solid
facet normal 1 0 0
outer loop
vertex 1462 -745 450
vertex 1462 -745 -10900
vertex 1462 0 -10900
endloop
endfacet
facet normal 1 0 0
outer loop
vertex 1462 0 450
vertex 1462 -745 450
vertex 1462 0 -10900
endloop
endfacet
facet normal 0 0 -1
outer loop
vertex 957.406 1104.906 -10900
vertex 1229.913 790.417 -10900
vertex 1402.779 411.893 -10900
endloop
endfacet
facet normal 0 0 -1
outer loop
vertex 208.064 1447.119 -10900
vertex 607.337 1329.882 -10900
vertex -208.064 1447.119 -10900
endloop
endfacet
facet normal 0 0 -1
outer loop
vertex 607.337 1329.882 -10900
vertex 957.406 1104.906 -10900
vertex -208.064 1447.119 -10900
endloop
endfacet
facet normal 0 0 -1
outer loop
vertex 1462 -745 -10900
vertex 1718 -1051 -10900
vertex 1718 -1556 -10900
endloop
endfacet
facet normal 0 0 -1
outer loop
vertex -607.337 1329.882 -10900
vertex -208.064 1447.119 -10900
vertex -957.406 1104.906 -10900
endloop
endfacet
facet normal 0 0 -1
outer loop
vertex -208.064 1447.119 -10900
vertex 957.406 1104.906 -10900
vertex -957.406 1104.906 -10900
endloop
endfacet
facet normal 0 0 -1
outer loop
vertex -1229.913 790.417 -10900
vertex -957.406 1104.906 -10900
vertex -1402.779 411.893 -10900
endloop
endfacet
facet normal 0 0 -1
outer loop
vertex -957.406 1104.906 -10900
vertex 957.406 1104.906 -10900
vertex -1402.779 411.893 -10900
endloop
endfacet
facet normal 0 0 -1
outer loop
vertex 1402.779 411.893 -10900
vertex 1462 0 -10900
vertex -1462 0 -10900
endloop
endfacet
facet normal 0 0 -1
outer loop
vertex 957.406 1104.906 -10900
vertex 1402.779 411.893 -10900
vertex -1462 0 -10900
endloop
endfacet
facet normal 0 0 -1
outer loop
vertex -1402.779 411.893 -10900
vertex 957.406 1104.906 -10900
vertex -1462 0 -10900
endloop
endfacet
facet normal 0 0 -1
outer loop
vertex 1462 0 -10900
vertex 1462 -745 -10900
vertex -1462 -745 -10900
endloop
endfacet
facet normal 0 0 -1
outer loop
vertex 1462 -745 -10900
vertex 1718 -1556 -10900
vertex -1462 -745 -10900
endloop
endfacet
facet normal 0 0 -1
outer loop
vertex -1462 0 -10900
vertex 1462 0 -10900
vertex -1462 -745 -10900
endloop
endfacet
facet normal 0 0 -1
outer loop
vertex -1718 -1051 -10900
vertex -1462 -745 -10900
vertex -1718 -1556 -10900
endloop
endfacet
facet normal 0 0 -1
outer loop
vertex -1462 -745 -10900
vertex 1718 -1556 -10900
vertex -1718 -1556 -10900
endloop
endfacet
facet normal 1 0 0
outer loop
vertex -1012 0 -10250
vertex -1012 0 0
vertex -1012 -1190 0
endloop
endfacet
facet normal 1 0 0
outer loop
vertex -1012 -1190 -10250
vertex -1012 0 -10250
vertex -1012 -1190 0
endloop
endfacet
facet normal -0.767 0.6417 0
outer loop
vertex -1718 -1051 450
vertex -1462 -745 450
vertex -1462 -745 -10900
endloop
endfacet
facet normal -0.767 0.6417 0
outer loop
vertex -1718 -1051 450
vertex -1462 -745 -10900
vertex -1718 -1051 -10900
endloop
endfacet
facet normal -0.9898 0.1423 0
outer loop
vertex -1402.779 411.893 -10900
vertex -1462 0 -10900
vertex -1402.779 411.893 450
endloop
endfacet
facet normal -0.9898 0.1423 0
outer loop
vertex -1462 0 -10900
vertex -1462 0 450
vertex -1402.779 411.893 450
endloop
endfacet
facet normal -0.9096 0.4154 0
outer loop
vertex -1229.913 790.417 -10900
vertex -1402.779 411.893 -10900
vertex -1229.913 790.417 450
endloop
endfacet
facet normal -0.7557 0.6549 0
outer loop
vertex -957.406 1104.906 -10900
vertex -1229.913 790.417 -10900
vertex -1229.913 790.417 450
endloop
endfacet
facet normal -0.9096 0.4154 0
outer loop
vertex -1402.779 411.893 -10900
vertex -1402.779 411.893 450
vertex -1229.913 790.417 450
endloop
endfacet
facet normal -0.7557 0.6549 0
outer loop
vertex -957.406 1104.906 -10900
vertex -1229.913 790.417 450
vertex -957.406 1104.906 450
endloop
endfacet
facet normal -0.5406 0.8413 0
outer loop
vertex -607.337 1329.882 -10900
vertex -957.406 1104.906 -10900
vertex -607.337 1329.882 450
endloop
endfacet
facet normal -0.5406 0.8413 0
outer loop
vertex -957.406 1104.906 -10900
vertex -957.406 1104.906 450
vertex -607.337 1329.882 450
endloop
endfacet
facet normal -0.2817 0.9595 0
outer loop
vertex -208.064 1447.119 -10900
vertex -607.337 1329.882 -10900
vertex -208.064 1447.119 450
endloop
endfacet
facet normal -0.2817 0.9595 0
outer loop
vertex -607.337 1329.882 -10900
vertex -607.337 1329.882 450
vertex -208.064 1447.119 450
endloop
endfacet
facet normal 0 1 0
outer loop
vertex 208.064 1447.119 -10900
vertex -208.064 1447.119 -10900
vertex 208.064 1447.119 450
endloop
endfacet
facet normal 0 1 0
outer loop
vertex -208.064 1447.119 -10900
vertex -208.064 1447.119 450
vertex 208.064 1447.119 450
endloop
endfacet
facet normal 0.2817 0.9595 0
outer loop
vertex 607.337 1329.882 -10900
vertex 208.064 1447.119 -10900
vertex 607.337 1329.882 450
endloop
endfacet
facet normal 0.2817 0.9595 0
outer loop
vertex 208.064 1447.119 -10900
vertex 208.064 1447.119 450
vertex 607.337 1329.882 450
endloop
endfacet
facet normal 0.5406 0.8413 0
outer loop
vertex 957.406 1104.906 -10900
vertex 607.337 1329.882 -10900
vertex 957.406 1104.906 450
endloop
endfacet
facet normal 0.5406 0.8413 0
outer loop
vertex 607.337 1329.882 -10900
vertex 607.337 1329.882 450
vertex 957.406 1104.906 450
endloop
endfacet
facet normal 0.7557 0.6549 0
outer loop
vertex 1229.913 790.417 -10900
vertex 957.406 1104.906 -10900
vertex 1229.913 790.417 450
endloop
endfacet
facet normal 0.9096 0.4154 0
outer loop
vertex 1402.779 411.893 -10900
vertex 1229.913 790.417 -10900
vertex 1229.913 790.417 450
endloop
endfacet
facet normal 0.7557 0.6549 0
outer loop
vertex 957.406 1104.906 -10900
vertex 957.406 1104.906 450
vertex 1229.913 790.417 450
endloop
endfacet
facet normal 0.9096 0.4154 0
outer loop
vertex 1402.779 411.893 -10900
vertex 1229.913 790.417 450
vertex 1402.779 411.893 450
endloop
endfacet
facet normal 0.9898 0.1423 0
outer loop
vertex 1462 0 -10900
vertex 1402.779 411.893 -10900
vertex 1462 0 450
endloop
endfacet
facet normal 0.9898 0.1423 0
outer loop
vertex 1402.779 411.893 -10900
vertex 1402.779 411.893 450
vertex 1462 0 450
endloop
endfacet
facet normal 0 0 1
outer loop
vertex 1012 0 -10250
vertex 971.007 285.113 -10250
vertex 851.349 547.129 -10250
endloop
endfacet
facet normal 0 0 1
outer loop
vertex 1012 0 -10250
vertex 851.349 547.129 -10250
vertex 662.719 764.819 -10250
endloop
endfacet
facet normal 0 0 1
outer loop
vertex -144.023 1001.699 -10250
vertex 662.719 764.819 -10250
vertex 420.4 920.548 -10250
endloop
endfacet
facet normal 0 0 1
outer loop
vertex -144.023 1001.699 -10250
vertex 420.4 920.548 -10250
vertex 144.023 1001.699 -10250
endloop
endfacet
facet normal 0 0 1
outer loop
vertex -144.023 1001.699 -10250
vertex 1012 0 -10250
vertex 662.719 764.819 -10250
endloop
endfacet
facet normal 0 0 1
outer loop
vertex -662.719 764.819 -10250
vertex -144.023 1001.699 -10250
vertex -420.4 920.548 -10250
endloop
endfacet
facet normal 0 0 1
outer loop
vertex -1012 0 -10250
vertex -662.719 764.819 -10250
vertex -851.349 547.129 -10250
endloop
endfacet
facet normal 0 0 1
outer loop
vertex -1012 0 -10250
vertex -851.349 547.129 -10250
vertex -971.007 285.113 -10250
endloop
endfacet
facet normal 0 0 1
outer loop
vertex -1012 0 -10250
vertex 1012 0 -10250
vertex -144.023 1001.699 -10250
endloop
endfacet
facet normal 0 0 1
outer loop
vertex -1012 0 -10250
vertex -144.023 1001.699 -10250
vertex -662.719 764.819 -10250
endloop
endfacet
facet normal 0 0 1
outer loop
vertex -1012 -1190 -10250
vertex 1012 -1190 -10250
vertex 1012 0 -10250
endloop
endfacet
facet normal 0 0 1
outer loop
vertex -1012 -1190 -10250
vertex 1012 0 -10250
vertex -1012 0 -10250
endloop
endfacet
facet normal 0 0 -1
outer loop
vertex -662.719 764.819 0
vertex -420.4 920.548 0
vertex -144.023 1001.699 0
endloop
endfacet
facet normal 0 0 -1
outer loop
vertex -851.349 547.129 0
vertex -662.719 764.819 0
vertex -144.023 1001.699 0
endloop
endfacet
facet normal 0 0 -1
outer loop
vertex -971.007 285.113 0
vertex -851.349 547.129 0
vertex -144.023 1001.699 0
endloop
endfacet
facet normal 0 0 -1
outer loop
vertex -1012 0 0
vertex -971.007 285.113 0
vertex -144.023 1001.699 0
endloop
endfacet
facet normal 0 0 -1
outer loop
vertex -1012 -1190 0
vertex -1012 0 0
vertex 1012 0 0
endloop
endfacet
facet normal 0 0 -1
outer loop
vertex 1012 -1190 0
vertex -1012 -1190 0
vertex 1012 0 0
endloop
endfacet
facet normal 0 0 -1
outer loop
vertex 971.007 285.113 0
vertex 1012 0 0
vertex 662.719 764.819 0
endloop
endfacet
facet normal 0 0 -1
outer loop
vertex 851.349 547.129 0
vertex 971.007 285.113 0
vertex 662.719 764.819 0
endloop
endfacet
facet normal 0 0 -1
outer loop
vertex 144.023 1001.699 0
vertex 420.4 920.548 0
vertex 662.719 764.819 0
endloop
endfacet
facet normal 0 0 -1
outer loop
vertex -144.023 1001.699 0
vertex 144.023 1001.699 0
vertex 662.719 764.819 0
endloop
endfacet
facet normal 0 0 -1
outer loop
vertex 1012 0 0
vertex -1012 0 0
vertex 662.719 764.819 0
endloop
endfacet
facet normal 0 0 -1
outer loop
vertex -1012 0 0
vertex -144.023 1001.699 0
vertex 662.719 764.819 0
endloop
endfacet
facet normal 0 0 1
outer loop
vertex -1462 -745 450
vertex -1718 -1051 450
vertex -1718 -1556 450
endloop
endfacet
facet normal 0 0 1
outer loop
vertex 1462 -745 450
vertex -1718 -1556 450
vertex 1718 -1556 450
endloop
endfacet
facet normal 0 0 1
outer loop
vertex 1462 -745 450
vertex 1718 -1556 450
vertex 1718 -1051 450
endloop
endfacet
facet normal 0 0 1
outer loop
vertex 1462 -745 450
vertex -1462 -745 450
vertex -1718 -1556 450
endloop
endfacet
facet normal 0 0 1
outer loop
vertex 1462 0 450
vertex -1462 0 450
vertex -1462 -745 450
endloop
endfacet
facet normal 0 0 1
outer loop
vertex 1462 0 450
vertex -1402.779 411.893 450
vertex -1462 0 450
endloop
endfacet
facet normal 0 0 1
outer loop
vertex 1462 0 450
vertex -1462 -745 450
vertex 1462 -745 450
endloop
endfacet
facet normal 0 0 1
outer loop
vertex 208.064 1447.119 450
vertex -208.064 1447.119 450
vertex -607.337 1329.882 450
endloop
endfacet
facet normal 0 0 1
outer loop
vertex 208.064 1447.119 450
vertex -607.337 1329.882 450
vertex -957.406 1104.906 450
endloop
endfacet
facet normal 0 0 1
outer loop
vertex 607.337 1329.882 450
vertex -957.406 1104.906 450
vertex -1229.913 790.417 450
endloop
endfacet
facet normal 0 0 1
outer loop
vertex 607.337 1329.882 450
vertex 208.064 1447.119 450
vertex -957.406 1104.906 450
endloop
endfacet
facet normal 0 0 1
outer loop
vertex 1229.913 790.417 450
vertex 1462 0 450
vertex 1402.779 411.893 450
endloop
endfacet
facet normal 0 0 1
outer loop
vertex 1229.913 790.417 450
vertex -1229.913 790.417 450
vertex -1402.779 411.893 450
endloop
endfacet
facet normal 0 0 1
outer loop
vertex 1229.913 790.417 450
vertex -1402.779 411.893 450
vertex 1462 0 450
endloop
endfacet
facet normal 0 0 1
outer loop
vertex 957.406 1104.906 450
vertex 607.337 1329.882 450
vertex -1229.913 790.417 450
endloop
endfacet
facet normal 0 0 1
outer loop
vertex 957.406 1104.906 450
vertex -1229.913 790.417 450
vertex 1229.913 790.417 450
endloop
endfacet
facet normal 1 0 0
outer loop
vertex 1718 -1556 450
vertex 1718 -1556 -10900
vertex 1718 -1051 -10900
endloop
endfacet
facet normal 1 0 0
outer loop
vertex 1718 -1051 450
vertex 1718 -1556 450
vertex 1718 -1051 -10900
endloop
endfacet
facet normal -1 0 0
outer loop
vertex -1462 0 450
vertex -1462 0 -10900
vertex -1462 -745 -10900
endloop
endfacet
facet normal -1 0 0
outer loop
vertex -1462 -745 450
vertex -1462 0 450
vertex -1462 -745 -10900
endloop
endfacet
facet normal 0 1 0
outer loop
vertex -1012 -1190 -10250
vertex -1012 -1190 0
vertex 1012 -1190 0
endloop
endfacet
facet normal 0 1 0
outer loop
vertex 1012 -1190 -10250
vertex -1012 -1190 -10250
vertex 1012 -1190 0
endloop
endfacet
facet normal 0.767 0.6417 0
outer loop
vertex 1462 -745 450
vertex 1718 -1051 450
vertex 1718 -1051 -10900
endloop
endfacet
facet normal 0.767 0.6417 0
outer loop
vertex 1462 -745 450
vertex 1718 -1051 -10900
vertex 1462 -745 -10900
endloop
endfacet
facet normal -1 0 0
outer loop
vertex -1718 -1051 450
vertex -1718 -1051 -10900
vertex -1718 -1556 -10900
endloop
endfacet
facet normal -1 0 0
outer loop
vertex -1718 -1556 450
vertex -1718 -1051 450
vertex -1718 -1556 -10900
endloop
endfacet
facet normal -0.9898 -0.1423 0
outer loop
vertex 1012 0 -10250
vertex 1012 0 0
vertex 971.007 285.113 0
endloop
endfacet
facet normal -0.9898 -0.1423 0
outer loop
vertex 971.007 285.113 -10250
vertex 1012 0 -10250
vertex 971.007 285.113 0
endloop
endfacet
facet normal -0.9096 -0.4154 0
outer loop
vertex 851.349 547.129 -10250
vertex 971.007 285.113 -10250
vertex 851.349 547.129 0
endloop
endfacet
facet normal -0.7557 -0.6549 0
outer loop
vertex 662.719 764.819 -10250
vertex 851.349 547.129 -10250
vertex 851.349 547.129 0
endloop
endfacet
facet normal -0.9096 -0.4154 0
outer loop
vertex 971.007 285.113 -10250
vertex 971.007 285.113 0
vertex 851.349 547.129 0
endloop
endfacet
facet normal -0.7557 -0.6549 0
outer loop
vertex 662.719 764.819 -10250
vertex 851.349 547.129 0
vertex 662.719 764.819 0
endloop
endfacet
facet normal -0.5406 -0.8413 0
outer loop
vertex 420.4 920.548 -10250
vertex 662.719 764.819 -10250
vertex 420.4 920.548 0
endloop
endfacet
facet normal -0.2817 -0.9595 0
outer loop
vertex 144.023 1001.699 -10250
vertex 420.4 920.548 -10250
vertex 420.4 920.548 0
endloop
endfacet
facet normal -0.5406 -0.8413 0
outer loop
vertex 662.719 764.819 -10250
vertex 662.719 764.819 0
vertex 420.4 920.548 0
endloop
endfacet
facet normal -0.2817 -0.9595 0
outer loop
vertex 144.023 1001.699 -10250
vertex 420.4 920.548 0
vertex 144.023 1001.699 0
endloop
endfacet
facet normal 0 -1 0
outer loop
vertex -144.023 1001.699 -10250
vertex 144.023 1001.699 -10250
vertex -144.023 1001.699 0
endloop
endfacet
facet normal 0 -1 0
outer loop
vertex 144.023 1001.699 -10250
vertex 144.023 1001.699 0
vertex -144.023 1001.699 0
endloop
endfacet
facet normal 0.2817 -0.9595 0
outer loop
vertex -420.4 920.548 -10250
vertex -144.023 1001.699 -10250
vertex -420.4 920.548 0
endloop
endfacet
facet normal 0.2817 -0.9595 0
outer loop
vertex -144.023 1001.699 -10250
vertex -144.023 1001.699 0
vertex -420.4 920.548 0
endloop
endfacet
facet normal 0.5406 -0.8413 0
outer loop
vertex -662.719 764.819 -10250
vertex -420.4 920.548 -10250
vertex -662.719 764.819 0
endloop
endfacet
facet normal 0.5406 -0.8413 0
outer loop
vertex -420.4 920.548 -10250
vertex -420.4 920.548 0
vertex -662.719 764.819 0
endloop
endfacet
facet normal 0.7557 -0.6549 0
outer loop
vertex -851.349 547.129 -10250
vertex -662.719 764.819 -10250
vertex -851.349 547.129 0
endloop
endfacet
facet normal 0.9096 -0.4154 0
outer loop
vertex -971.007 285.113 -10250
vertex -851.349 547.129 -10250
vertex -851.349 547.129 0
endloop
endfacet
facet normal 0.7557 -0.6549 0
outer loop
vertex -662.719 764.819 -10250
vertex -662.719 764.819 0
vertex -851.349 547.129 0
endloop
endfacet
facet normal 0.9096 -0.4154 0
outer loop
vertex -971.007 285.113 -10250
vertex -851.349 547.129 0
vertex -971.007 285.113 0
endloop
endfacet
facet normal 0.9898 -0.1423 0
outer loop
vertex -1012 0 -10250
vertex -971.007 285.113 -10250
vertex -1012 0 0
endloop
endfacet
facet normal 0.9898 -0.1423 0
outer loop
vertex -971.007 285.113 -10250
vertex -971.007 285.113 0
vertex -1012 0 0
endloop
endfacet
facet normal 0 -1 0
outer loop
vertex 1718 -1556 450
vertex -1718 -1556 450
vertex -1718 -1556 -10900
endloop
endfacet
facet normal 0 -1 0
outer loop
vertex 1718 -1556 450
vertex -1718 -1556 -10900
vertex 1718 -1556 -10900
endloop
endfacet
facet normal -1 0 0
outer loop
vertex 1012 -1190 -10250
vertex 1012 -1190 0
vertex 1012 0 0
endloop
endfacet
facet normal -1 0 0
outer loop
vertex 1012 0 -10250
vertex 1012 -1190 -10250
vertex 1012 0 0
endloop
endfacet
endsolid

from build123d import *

# Parameters (mm, degrees)
PAD_DEPTH    = 10250
PAD001_DEPTH = 450
PAD002_DEPTH = 650


with BuildPart() as part:
    # Sketch001 → Pad (new body)
    with BuildSketch(Plane.XY):
        with BuildLine():
            ThreePointArc((1462, 0), (0, 1462), (-1462, 0))
            Line((-1462, 0), (-1462, -745))
            Line((-1462, -745), (-1718, -1051))
            Line((-1718, -1051), (-1718, -1556))
            Line((-1718, -1556), (1718, -1556))
            Line((1718, -1556), (1718, -1051))
            Line((1718, -1051), (1462, -745))
            Line((1462, -745), (1462, 0))
        make_face()
        with BuildLine():
            ThreePointArc((1012, 0), (0, 1012), (-1012, 0))
            Line((-1012, 0), (-1012, -1190))
            Line((-1012, -1190), (1012, -1190))
            Line((1012, -1190), (1012, 0))
        make_face(mode=Mode.SUBTRACT)
    extrude(amount=-PAD_DEPTH)

    # Sketch002 (on Face13 of Pad) → Pad001 (join)
    with BuildSketch(Plane.XY):
        with BuildLine():
            Line((-1462, 0), (-1462, -745))
            Line((-1462, -745), (-1718, -1051))
            Line((-1718, -1051), (-1718, -1556))
            Line((-1718, -1556), (1718, -1556))
            Line((1718, -1556), (1718, -1051))
            Line((1718, -1051), (1462, -745))
            Line((1462, -745), (1462, 0))
            ThreePointArc((1462, 0), (0, 1462), (-1462, 0))
        make_face()
    extrude(amount=PAD001_DEPTH)

    # Sketch003 (on Face1 of Pad001) → Pad002 (join)
    with BuildSketch(Plane(origin=(0, 0, -10250), x_dir=(1, 0, 0), z_dir=(0, 0, -1))):
        with BuildLine():
            Line((-1462, 0), (-1462, 745))
            Line((-1462, 745), (-1718, 1051))
            Line((-1718, 1051), (-1718, 1556))
            Line((-1718, 1556), (1718, 1556))
            Line((1718, 1556), (1718, 1051))
            Line((1718, 1051), (1462, 745))
            Line((1462, 745), (1462, 0))
            ThreePointArc((-1462, 0), (0, -1462), (1462, 0))
        make_face()
    extrude(amount=PAD002_DEPTH)


solid = part.part
